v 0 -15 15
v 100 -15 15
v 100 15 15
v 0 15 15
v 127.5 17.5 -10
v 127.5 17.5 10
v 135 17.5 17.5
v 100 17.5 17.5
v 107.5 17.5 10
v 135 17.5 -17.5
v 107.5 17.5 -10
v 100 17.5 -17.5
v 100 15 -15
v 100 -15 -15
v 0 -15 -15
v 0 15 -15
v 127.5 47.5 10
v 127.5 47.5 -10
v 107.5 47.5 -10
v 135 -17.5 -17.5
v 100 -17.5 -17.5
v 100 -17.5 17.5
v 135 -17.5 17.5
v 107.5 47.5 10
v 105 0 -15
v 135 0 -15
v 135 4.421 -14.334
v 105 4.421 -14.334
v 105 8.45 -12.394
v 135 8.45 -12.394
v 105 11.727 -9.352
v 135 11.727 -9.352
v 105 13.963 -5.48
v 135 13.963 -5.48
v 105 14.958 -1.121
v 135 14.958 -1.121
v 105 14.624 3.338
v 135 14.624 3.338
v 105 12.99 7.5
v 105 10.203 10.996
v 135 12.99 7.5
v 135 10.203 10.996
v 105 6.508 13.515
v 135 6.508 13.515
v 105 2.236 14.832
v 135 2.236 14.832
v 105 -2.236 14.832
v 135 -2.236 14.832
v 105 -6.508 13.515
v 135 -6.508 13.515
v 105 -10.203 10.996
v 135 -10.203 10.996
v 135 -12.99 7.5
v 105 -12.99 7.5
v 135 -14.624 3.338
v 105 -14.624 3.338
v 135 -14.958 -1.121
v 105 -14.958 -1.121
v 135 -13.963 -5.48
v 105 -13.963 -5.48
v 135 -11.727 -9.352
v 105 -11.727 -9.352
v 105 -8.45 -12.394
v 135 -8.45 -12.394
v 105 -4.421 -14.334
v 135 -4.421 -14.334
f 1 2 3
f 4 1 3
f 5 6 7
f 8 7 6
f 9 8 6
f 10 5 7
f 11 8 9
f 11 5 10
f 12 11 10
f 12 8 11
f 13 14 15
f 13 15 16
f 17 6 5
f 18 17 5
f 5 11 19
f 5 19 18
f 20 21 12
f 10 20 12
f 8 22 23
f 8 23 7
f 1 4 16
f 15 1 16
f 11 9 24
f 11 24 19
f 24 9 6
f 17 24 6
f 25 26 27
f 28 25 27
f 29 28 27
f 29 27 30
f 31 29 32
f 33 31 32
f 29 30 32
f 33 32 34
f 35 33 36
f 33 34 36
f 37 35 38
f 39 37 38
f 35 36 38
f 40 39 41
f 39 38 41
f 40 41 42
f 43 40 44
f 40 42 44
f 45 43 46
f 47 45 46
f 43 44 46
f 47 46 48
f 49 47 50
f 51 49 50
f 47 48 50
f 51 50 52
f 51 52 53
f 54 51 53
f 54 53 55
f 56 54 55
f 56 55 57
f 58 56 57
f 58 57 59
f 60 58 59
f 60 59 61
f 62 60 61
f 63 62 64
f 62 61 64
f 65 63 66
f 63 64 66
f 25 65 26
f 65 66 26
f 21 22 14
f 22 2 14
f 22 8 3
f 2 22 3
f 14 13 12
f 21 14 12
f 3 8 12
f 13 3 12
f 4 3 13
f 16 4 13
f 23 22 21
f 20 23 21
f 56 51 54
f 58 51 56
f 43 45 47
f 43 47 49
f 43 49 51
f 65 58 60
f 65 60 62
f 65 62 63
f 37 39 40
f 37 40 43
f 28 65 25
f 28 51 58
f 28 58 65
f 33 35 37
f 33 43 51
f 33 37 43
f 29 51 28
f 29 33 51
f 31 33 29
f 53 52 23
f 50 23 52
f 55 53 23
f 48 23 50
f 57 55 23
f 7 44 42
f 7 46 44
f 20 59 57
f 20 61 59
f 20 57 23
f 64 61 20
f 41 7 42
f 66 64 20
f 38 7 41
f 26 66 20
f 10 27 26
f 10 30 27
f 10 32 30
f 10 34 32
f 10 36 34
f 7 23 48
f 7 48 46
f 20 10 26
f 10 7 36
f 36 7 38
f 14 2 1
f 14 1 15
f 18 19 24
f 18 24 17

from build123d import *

# Parameters (mm, degrees)
SKETCH1_W           = 30
SKETCH1_H           = 30
BOSS_EXTRUDE1_DEPTH = 100
SKETCH2_W           = 35
SKETCH2_H           = 35
BOSS_EXTRUDE2_DEPTH = 35
SKETCH3_R           = 15
CUT_EXTRUDE1_DEPTH  = 30
SKETCH4_W           = 20
SKETCH4_H           = 20
BOSS_EXTRUDE3_DEPTH = 30


with BuildPart() as part:
    # Sketch1 → Boss-Extrude1 (new body)
    with BuildSketch(Plane(origin=(0, 0, 0), x_dir=(0, 0, -1), z_dir=(1, 0, 0))):
        Rectangle(SKETCH1_W, SKETCH1_H)
    extrude(amount=BOSS_EXTRUDE1_DEPTH)

    # Sketch2 → Boss-Extrude2 (add)
    with BuildSketch(Plane(origin=(100, 0, 0), x_dir=(0, 0, -1), z_dir=(1, 0, 0))):
        Rectangle(SKETCH2_W, SKETCH2_H)
    extrude(amount=BOSS_EXTRUDE2_DEPTH)

    # Sketch3 → Cut-Extrude1 (cut)
    with BuildSketch(Plane(origin=(135, 0, 0), x_dir=(0, 0, -1), z_dir=(1, 0, 0))):
        Circle(SKETCH3_R)
    extrude(amount=-CUT_EXTRUDE1_DEPTH, mode=Mode.SUBTRACT)

    # Sketch4 → Boss-Extrude3 (add)
    with BuildSketch(Plane(origin=(0, 17.5, 0), x_dir=(1, 0, 0), z_dir=(0, 1, 0))):
        with Locations((117.5, 0)):
            Rectangle(SKETCH4_W, SKETCH4_H)
    extrude(amount=BOSS_EXTRUDE3_DEPTH)


solid = part.part
